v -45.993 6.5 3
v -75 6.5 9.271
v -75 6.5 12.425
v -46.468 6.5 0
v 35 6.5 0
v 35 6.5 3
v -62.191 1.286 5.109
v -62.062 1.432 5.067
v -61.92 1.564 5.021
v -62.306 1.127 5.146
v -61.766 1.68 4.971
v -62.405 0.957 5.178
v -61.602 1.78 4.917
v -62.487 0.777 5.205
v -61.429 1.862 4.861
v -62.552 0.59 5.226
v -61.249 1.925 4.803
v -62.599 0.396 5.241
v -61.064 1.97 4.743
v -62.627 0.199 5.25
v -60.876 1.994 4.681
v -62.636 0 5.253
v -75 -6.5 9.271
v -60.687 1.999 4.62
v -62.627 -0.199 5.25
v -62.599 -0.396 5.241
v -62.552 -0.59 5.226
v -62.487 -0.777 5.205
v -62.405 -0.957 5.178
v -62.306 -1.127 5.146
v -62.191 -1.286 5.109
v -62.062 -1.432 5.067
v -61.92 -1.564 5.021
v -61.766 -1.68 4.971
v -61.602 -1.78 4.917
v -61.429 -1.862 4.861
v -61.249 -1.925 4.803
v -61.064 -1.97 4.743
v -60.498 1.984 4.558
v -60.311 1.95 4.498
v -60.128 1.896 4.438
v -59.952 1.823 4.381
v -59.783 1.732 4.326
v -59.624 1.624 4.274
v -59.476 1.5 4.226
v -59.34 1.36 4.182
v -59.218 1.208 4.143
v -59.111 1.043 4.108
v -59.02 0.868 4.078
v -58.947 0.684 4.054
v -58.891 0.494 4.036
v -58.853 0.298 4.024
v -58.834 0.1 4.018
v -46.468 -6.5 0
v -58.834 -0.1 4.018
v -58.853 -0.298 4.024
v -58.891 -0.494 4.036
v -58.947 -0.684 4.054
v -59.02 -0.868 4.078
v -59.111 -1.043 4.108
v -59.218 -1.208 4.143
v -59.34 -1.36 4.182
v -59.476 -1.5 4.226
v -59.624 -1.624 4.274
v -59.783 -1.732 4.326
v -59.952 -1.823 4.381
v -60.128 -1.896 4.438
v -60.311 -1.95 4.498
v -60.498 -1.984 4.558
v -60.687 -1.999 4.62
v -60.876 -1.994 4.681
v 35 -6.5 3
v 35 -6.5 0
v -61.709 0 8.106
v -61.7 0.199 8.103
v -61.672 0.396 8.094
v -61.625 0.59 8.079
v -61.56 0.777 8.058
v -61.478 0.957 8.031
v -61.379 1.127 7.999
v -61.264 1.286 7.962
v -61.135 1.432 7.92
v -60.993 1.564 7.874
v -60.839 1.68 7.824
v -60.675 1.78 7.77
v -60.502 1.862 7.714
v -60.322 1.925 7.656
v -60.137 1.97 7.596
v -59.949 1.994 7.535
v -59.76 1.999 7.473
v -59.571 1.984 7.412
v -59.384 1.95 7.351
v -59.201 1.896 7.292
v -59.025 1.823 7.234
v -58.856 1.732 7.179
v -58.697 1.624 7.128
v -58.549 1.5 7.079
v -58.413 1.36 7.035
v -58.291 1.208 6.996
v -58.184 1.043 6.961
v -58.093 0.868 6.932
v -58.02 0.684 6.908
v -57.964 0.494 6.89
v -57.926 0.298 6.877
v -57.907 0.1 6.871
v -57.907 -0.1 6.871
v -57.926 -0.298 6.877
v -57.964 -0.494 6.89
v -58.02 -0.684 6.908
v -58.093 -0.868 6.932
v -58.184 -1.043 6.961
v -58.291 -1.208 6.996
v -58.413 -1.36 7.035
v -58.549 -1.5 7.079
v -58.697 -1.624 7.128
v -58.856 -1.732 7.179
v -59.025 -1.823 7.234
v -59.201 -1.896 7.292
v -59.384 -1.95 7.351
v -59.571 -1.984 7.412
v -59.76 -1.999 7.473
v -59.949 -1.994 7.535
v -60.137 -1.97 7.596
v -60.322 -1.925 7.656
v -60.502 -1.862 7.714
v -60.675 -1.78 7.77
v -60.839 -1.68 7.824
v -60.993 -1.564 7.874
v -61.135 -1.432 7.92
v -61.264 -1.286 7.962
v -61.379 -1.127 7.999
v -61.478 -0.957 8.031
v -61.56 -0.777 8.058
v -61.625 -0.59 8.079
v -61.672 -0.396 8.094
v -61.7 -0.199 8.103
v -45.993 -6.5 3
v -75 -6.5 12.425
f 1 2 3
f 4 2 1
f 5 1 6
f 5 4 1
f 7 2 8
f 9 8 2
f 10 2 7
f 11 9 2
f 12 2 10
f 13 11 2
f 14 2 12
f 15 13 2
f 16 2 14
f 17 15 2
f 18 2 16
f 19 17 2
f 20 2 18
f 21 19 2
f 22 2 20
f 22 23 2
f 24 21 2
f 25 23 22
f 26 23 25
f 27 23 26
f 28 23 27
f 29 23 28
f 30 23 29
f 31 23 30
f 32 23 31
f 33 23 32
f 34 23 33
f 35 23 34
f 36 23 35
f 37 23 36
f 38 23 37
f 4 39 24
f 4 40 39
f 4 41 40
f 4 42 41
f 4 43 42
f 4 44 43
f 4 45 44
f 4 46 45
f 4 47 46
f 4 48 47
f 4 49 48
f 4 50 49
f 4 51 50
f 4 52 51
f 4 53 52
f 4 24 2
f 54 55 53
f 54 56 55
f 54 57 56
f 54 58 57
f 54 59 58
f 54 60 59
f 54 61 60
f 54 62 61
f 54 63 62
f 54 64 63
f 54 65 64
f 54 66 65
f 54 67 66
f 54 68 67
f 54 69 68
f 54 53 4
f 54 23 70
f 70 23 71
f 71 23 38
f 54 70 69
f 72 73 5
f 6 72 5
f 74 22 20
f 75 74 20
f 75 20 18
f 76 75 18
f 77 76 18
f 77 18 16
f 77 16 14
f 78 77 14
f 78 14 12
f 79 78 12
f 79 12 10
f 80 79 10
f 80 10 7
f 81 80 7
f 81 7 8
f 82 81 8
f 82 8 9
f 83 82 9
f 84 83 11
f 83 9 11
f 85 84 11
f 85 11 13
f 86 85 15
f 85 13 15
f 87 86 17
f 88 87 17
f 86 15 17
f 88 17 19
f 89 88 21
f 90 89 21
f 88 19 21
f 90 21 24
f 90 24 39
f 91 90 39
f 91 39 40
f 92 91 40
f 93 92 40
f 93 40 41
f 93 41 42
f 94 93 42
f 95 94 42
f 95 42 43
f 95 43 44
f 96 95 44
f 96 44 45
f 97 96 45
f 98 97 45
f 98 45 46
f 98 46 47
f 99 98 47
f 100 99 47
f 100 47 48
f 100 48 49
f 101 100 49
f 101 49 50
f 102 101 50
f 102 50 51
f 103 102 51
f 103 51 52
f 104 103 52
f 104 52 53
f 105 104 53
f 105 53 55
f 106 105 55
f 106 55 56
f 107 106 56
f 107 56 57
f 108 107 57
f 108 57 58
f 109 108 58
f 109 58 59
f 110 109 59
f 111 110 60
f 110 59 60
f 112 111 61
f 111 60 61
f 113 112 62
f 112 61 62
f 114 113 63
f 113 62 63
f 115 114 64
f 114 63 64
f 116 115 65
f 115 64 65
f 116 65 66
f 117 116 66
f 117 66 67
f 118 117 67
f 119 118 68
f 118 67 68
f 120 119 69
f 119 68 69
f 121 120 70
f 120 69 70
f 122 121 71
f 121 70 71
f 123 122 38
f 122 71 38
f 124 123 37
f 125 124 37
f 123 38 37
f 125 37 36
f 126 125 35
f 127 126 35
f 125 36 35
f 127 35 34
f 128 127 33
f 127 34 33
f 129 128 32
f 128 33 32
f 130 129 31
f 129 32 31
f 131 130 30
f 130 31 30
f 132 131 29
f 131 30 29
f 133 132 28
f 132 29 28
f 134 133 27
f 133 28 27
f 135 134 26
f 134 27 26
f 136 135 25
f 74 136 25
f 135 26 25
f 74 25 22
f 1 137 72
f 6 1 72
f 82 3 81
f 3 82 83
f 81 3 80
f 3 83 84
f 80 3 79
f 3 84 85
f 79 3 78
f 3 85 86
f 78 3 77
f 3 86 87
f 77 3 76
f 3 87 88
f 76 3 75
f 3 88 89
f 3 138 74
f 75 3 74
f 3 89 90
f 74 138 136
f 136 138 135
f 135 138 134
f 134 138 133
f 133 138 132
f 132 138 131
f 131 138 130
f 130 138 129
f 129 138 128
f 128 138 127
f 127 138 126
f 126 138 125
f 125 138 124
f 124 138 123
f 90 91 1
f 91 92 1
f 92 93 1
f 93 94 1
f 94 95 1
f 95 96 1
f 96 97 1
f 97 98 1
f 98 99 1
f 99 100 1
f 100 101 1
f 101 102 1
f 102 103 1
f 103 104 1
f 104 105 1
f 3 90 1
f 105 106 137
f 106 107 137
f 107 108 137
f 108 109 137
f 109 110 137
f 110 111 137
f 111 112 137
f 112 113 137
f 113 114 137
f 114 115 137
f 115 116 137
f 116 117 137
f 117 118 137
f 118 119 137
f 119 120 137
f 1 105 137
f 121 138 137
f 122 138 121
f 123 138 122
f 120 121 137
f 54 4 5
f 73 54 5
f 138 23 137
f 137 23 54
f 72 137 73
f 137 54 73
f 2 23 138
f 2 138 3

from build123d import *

# Parameters (mm, degrees)
SKETCH1_W           = 150
SKETCH1_H           = 13
BOSS_EXTRUDE1_DEPTH = 40
CUT_EXTRUDE1_DEPTH  = 40
CUT_EXTRUDE3_DEPTH  = 86.988371307
SKETCH8_R           = 2
CUT_EXTRUDE7_DEPTH  = 6.5
SKETCH4_W           = 40
SKETCH4_H           = 13
CUT_EXTRUDE10_DEPTH = 77.299594056


with BuildPart() as part:
    # Sketch1 → Boss-Extrude1 (new body)
    with BuildSketch(Plane.XY):
        Rectangle(SKETCH1_W, SKETCH1_H)
    extrude(amount=BOSS_EXTRUDE1_DEPTH)

    # Sketch2 → Cut-Extrude1 (cut)
    with BuildSketch(Plane.XZ.offset(6.5)):
        Polygon((-75, 9.270509831), (-46.468304511, 0), (-75, 0), align=None)
    extrude(amount=-CUT_EXTRUDE1_DEPTH, mode=Mode.SUBTRACT)

    # Sketch3 → Cut-Extrude3 (cut, through all)
    with BuildSketch(Plane.XZ.offset(6.5)):
        Polygon((-75, 12.424896504), (-45.99315119, 3), (75, 3), (75, 40), (-75, 40), align=None)
    extrude(amount=-CUT_EXTRUDE3_DEPTH, mode=Mode.SUBTRACT)

    # Sketch8 → Cut-Extrude7 (cut)
    with BuildSketch(Plane(origin=(-4.437328231, 0, -13.656692045), x_dir=(-0.9510565162951532, 0, 0.30901699437494873), z_dir=(-0.30901699437494873, 0, -0.9510565162951532))):
        with Locations((59.193983807, 0)):
            Circle(SKETCH8_R)
    extrude(amount=-CUT_EXTRUDE7_DEPTH, mode=Mode.SUBTRACT)

    # Sketch4 → Cut-Extrude10 (cut, through all)
    with BuildSketch(Plane.XY):
        with Locations((55, 0)):
            Rectangle(SKETCH4_W, SKETCH4_H)
    extrude(amount=CUT_EXTRUDE10_DEPTH, mode=Mode.SUBTRACT)


solid = part.part
